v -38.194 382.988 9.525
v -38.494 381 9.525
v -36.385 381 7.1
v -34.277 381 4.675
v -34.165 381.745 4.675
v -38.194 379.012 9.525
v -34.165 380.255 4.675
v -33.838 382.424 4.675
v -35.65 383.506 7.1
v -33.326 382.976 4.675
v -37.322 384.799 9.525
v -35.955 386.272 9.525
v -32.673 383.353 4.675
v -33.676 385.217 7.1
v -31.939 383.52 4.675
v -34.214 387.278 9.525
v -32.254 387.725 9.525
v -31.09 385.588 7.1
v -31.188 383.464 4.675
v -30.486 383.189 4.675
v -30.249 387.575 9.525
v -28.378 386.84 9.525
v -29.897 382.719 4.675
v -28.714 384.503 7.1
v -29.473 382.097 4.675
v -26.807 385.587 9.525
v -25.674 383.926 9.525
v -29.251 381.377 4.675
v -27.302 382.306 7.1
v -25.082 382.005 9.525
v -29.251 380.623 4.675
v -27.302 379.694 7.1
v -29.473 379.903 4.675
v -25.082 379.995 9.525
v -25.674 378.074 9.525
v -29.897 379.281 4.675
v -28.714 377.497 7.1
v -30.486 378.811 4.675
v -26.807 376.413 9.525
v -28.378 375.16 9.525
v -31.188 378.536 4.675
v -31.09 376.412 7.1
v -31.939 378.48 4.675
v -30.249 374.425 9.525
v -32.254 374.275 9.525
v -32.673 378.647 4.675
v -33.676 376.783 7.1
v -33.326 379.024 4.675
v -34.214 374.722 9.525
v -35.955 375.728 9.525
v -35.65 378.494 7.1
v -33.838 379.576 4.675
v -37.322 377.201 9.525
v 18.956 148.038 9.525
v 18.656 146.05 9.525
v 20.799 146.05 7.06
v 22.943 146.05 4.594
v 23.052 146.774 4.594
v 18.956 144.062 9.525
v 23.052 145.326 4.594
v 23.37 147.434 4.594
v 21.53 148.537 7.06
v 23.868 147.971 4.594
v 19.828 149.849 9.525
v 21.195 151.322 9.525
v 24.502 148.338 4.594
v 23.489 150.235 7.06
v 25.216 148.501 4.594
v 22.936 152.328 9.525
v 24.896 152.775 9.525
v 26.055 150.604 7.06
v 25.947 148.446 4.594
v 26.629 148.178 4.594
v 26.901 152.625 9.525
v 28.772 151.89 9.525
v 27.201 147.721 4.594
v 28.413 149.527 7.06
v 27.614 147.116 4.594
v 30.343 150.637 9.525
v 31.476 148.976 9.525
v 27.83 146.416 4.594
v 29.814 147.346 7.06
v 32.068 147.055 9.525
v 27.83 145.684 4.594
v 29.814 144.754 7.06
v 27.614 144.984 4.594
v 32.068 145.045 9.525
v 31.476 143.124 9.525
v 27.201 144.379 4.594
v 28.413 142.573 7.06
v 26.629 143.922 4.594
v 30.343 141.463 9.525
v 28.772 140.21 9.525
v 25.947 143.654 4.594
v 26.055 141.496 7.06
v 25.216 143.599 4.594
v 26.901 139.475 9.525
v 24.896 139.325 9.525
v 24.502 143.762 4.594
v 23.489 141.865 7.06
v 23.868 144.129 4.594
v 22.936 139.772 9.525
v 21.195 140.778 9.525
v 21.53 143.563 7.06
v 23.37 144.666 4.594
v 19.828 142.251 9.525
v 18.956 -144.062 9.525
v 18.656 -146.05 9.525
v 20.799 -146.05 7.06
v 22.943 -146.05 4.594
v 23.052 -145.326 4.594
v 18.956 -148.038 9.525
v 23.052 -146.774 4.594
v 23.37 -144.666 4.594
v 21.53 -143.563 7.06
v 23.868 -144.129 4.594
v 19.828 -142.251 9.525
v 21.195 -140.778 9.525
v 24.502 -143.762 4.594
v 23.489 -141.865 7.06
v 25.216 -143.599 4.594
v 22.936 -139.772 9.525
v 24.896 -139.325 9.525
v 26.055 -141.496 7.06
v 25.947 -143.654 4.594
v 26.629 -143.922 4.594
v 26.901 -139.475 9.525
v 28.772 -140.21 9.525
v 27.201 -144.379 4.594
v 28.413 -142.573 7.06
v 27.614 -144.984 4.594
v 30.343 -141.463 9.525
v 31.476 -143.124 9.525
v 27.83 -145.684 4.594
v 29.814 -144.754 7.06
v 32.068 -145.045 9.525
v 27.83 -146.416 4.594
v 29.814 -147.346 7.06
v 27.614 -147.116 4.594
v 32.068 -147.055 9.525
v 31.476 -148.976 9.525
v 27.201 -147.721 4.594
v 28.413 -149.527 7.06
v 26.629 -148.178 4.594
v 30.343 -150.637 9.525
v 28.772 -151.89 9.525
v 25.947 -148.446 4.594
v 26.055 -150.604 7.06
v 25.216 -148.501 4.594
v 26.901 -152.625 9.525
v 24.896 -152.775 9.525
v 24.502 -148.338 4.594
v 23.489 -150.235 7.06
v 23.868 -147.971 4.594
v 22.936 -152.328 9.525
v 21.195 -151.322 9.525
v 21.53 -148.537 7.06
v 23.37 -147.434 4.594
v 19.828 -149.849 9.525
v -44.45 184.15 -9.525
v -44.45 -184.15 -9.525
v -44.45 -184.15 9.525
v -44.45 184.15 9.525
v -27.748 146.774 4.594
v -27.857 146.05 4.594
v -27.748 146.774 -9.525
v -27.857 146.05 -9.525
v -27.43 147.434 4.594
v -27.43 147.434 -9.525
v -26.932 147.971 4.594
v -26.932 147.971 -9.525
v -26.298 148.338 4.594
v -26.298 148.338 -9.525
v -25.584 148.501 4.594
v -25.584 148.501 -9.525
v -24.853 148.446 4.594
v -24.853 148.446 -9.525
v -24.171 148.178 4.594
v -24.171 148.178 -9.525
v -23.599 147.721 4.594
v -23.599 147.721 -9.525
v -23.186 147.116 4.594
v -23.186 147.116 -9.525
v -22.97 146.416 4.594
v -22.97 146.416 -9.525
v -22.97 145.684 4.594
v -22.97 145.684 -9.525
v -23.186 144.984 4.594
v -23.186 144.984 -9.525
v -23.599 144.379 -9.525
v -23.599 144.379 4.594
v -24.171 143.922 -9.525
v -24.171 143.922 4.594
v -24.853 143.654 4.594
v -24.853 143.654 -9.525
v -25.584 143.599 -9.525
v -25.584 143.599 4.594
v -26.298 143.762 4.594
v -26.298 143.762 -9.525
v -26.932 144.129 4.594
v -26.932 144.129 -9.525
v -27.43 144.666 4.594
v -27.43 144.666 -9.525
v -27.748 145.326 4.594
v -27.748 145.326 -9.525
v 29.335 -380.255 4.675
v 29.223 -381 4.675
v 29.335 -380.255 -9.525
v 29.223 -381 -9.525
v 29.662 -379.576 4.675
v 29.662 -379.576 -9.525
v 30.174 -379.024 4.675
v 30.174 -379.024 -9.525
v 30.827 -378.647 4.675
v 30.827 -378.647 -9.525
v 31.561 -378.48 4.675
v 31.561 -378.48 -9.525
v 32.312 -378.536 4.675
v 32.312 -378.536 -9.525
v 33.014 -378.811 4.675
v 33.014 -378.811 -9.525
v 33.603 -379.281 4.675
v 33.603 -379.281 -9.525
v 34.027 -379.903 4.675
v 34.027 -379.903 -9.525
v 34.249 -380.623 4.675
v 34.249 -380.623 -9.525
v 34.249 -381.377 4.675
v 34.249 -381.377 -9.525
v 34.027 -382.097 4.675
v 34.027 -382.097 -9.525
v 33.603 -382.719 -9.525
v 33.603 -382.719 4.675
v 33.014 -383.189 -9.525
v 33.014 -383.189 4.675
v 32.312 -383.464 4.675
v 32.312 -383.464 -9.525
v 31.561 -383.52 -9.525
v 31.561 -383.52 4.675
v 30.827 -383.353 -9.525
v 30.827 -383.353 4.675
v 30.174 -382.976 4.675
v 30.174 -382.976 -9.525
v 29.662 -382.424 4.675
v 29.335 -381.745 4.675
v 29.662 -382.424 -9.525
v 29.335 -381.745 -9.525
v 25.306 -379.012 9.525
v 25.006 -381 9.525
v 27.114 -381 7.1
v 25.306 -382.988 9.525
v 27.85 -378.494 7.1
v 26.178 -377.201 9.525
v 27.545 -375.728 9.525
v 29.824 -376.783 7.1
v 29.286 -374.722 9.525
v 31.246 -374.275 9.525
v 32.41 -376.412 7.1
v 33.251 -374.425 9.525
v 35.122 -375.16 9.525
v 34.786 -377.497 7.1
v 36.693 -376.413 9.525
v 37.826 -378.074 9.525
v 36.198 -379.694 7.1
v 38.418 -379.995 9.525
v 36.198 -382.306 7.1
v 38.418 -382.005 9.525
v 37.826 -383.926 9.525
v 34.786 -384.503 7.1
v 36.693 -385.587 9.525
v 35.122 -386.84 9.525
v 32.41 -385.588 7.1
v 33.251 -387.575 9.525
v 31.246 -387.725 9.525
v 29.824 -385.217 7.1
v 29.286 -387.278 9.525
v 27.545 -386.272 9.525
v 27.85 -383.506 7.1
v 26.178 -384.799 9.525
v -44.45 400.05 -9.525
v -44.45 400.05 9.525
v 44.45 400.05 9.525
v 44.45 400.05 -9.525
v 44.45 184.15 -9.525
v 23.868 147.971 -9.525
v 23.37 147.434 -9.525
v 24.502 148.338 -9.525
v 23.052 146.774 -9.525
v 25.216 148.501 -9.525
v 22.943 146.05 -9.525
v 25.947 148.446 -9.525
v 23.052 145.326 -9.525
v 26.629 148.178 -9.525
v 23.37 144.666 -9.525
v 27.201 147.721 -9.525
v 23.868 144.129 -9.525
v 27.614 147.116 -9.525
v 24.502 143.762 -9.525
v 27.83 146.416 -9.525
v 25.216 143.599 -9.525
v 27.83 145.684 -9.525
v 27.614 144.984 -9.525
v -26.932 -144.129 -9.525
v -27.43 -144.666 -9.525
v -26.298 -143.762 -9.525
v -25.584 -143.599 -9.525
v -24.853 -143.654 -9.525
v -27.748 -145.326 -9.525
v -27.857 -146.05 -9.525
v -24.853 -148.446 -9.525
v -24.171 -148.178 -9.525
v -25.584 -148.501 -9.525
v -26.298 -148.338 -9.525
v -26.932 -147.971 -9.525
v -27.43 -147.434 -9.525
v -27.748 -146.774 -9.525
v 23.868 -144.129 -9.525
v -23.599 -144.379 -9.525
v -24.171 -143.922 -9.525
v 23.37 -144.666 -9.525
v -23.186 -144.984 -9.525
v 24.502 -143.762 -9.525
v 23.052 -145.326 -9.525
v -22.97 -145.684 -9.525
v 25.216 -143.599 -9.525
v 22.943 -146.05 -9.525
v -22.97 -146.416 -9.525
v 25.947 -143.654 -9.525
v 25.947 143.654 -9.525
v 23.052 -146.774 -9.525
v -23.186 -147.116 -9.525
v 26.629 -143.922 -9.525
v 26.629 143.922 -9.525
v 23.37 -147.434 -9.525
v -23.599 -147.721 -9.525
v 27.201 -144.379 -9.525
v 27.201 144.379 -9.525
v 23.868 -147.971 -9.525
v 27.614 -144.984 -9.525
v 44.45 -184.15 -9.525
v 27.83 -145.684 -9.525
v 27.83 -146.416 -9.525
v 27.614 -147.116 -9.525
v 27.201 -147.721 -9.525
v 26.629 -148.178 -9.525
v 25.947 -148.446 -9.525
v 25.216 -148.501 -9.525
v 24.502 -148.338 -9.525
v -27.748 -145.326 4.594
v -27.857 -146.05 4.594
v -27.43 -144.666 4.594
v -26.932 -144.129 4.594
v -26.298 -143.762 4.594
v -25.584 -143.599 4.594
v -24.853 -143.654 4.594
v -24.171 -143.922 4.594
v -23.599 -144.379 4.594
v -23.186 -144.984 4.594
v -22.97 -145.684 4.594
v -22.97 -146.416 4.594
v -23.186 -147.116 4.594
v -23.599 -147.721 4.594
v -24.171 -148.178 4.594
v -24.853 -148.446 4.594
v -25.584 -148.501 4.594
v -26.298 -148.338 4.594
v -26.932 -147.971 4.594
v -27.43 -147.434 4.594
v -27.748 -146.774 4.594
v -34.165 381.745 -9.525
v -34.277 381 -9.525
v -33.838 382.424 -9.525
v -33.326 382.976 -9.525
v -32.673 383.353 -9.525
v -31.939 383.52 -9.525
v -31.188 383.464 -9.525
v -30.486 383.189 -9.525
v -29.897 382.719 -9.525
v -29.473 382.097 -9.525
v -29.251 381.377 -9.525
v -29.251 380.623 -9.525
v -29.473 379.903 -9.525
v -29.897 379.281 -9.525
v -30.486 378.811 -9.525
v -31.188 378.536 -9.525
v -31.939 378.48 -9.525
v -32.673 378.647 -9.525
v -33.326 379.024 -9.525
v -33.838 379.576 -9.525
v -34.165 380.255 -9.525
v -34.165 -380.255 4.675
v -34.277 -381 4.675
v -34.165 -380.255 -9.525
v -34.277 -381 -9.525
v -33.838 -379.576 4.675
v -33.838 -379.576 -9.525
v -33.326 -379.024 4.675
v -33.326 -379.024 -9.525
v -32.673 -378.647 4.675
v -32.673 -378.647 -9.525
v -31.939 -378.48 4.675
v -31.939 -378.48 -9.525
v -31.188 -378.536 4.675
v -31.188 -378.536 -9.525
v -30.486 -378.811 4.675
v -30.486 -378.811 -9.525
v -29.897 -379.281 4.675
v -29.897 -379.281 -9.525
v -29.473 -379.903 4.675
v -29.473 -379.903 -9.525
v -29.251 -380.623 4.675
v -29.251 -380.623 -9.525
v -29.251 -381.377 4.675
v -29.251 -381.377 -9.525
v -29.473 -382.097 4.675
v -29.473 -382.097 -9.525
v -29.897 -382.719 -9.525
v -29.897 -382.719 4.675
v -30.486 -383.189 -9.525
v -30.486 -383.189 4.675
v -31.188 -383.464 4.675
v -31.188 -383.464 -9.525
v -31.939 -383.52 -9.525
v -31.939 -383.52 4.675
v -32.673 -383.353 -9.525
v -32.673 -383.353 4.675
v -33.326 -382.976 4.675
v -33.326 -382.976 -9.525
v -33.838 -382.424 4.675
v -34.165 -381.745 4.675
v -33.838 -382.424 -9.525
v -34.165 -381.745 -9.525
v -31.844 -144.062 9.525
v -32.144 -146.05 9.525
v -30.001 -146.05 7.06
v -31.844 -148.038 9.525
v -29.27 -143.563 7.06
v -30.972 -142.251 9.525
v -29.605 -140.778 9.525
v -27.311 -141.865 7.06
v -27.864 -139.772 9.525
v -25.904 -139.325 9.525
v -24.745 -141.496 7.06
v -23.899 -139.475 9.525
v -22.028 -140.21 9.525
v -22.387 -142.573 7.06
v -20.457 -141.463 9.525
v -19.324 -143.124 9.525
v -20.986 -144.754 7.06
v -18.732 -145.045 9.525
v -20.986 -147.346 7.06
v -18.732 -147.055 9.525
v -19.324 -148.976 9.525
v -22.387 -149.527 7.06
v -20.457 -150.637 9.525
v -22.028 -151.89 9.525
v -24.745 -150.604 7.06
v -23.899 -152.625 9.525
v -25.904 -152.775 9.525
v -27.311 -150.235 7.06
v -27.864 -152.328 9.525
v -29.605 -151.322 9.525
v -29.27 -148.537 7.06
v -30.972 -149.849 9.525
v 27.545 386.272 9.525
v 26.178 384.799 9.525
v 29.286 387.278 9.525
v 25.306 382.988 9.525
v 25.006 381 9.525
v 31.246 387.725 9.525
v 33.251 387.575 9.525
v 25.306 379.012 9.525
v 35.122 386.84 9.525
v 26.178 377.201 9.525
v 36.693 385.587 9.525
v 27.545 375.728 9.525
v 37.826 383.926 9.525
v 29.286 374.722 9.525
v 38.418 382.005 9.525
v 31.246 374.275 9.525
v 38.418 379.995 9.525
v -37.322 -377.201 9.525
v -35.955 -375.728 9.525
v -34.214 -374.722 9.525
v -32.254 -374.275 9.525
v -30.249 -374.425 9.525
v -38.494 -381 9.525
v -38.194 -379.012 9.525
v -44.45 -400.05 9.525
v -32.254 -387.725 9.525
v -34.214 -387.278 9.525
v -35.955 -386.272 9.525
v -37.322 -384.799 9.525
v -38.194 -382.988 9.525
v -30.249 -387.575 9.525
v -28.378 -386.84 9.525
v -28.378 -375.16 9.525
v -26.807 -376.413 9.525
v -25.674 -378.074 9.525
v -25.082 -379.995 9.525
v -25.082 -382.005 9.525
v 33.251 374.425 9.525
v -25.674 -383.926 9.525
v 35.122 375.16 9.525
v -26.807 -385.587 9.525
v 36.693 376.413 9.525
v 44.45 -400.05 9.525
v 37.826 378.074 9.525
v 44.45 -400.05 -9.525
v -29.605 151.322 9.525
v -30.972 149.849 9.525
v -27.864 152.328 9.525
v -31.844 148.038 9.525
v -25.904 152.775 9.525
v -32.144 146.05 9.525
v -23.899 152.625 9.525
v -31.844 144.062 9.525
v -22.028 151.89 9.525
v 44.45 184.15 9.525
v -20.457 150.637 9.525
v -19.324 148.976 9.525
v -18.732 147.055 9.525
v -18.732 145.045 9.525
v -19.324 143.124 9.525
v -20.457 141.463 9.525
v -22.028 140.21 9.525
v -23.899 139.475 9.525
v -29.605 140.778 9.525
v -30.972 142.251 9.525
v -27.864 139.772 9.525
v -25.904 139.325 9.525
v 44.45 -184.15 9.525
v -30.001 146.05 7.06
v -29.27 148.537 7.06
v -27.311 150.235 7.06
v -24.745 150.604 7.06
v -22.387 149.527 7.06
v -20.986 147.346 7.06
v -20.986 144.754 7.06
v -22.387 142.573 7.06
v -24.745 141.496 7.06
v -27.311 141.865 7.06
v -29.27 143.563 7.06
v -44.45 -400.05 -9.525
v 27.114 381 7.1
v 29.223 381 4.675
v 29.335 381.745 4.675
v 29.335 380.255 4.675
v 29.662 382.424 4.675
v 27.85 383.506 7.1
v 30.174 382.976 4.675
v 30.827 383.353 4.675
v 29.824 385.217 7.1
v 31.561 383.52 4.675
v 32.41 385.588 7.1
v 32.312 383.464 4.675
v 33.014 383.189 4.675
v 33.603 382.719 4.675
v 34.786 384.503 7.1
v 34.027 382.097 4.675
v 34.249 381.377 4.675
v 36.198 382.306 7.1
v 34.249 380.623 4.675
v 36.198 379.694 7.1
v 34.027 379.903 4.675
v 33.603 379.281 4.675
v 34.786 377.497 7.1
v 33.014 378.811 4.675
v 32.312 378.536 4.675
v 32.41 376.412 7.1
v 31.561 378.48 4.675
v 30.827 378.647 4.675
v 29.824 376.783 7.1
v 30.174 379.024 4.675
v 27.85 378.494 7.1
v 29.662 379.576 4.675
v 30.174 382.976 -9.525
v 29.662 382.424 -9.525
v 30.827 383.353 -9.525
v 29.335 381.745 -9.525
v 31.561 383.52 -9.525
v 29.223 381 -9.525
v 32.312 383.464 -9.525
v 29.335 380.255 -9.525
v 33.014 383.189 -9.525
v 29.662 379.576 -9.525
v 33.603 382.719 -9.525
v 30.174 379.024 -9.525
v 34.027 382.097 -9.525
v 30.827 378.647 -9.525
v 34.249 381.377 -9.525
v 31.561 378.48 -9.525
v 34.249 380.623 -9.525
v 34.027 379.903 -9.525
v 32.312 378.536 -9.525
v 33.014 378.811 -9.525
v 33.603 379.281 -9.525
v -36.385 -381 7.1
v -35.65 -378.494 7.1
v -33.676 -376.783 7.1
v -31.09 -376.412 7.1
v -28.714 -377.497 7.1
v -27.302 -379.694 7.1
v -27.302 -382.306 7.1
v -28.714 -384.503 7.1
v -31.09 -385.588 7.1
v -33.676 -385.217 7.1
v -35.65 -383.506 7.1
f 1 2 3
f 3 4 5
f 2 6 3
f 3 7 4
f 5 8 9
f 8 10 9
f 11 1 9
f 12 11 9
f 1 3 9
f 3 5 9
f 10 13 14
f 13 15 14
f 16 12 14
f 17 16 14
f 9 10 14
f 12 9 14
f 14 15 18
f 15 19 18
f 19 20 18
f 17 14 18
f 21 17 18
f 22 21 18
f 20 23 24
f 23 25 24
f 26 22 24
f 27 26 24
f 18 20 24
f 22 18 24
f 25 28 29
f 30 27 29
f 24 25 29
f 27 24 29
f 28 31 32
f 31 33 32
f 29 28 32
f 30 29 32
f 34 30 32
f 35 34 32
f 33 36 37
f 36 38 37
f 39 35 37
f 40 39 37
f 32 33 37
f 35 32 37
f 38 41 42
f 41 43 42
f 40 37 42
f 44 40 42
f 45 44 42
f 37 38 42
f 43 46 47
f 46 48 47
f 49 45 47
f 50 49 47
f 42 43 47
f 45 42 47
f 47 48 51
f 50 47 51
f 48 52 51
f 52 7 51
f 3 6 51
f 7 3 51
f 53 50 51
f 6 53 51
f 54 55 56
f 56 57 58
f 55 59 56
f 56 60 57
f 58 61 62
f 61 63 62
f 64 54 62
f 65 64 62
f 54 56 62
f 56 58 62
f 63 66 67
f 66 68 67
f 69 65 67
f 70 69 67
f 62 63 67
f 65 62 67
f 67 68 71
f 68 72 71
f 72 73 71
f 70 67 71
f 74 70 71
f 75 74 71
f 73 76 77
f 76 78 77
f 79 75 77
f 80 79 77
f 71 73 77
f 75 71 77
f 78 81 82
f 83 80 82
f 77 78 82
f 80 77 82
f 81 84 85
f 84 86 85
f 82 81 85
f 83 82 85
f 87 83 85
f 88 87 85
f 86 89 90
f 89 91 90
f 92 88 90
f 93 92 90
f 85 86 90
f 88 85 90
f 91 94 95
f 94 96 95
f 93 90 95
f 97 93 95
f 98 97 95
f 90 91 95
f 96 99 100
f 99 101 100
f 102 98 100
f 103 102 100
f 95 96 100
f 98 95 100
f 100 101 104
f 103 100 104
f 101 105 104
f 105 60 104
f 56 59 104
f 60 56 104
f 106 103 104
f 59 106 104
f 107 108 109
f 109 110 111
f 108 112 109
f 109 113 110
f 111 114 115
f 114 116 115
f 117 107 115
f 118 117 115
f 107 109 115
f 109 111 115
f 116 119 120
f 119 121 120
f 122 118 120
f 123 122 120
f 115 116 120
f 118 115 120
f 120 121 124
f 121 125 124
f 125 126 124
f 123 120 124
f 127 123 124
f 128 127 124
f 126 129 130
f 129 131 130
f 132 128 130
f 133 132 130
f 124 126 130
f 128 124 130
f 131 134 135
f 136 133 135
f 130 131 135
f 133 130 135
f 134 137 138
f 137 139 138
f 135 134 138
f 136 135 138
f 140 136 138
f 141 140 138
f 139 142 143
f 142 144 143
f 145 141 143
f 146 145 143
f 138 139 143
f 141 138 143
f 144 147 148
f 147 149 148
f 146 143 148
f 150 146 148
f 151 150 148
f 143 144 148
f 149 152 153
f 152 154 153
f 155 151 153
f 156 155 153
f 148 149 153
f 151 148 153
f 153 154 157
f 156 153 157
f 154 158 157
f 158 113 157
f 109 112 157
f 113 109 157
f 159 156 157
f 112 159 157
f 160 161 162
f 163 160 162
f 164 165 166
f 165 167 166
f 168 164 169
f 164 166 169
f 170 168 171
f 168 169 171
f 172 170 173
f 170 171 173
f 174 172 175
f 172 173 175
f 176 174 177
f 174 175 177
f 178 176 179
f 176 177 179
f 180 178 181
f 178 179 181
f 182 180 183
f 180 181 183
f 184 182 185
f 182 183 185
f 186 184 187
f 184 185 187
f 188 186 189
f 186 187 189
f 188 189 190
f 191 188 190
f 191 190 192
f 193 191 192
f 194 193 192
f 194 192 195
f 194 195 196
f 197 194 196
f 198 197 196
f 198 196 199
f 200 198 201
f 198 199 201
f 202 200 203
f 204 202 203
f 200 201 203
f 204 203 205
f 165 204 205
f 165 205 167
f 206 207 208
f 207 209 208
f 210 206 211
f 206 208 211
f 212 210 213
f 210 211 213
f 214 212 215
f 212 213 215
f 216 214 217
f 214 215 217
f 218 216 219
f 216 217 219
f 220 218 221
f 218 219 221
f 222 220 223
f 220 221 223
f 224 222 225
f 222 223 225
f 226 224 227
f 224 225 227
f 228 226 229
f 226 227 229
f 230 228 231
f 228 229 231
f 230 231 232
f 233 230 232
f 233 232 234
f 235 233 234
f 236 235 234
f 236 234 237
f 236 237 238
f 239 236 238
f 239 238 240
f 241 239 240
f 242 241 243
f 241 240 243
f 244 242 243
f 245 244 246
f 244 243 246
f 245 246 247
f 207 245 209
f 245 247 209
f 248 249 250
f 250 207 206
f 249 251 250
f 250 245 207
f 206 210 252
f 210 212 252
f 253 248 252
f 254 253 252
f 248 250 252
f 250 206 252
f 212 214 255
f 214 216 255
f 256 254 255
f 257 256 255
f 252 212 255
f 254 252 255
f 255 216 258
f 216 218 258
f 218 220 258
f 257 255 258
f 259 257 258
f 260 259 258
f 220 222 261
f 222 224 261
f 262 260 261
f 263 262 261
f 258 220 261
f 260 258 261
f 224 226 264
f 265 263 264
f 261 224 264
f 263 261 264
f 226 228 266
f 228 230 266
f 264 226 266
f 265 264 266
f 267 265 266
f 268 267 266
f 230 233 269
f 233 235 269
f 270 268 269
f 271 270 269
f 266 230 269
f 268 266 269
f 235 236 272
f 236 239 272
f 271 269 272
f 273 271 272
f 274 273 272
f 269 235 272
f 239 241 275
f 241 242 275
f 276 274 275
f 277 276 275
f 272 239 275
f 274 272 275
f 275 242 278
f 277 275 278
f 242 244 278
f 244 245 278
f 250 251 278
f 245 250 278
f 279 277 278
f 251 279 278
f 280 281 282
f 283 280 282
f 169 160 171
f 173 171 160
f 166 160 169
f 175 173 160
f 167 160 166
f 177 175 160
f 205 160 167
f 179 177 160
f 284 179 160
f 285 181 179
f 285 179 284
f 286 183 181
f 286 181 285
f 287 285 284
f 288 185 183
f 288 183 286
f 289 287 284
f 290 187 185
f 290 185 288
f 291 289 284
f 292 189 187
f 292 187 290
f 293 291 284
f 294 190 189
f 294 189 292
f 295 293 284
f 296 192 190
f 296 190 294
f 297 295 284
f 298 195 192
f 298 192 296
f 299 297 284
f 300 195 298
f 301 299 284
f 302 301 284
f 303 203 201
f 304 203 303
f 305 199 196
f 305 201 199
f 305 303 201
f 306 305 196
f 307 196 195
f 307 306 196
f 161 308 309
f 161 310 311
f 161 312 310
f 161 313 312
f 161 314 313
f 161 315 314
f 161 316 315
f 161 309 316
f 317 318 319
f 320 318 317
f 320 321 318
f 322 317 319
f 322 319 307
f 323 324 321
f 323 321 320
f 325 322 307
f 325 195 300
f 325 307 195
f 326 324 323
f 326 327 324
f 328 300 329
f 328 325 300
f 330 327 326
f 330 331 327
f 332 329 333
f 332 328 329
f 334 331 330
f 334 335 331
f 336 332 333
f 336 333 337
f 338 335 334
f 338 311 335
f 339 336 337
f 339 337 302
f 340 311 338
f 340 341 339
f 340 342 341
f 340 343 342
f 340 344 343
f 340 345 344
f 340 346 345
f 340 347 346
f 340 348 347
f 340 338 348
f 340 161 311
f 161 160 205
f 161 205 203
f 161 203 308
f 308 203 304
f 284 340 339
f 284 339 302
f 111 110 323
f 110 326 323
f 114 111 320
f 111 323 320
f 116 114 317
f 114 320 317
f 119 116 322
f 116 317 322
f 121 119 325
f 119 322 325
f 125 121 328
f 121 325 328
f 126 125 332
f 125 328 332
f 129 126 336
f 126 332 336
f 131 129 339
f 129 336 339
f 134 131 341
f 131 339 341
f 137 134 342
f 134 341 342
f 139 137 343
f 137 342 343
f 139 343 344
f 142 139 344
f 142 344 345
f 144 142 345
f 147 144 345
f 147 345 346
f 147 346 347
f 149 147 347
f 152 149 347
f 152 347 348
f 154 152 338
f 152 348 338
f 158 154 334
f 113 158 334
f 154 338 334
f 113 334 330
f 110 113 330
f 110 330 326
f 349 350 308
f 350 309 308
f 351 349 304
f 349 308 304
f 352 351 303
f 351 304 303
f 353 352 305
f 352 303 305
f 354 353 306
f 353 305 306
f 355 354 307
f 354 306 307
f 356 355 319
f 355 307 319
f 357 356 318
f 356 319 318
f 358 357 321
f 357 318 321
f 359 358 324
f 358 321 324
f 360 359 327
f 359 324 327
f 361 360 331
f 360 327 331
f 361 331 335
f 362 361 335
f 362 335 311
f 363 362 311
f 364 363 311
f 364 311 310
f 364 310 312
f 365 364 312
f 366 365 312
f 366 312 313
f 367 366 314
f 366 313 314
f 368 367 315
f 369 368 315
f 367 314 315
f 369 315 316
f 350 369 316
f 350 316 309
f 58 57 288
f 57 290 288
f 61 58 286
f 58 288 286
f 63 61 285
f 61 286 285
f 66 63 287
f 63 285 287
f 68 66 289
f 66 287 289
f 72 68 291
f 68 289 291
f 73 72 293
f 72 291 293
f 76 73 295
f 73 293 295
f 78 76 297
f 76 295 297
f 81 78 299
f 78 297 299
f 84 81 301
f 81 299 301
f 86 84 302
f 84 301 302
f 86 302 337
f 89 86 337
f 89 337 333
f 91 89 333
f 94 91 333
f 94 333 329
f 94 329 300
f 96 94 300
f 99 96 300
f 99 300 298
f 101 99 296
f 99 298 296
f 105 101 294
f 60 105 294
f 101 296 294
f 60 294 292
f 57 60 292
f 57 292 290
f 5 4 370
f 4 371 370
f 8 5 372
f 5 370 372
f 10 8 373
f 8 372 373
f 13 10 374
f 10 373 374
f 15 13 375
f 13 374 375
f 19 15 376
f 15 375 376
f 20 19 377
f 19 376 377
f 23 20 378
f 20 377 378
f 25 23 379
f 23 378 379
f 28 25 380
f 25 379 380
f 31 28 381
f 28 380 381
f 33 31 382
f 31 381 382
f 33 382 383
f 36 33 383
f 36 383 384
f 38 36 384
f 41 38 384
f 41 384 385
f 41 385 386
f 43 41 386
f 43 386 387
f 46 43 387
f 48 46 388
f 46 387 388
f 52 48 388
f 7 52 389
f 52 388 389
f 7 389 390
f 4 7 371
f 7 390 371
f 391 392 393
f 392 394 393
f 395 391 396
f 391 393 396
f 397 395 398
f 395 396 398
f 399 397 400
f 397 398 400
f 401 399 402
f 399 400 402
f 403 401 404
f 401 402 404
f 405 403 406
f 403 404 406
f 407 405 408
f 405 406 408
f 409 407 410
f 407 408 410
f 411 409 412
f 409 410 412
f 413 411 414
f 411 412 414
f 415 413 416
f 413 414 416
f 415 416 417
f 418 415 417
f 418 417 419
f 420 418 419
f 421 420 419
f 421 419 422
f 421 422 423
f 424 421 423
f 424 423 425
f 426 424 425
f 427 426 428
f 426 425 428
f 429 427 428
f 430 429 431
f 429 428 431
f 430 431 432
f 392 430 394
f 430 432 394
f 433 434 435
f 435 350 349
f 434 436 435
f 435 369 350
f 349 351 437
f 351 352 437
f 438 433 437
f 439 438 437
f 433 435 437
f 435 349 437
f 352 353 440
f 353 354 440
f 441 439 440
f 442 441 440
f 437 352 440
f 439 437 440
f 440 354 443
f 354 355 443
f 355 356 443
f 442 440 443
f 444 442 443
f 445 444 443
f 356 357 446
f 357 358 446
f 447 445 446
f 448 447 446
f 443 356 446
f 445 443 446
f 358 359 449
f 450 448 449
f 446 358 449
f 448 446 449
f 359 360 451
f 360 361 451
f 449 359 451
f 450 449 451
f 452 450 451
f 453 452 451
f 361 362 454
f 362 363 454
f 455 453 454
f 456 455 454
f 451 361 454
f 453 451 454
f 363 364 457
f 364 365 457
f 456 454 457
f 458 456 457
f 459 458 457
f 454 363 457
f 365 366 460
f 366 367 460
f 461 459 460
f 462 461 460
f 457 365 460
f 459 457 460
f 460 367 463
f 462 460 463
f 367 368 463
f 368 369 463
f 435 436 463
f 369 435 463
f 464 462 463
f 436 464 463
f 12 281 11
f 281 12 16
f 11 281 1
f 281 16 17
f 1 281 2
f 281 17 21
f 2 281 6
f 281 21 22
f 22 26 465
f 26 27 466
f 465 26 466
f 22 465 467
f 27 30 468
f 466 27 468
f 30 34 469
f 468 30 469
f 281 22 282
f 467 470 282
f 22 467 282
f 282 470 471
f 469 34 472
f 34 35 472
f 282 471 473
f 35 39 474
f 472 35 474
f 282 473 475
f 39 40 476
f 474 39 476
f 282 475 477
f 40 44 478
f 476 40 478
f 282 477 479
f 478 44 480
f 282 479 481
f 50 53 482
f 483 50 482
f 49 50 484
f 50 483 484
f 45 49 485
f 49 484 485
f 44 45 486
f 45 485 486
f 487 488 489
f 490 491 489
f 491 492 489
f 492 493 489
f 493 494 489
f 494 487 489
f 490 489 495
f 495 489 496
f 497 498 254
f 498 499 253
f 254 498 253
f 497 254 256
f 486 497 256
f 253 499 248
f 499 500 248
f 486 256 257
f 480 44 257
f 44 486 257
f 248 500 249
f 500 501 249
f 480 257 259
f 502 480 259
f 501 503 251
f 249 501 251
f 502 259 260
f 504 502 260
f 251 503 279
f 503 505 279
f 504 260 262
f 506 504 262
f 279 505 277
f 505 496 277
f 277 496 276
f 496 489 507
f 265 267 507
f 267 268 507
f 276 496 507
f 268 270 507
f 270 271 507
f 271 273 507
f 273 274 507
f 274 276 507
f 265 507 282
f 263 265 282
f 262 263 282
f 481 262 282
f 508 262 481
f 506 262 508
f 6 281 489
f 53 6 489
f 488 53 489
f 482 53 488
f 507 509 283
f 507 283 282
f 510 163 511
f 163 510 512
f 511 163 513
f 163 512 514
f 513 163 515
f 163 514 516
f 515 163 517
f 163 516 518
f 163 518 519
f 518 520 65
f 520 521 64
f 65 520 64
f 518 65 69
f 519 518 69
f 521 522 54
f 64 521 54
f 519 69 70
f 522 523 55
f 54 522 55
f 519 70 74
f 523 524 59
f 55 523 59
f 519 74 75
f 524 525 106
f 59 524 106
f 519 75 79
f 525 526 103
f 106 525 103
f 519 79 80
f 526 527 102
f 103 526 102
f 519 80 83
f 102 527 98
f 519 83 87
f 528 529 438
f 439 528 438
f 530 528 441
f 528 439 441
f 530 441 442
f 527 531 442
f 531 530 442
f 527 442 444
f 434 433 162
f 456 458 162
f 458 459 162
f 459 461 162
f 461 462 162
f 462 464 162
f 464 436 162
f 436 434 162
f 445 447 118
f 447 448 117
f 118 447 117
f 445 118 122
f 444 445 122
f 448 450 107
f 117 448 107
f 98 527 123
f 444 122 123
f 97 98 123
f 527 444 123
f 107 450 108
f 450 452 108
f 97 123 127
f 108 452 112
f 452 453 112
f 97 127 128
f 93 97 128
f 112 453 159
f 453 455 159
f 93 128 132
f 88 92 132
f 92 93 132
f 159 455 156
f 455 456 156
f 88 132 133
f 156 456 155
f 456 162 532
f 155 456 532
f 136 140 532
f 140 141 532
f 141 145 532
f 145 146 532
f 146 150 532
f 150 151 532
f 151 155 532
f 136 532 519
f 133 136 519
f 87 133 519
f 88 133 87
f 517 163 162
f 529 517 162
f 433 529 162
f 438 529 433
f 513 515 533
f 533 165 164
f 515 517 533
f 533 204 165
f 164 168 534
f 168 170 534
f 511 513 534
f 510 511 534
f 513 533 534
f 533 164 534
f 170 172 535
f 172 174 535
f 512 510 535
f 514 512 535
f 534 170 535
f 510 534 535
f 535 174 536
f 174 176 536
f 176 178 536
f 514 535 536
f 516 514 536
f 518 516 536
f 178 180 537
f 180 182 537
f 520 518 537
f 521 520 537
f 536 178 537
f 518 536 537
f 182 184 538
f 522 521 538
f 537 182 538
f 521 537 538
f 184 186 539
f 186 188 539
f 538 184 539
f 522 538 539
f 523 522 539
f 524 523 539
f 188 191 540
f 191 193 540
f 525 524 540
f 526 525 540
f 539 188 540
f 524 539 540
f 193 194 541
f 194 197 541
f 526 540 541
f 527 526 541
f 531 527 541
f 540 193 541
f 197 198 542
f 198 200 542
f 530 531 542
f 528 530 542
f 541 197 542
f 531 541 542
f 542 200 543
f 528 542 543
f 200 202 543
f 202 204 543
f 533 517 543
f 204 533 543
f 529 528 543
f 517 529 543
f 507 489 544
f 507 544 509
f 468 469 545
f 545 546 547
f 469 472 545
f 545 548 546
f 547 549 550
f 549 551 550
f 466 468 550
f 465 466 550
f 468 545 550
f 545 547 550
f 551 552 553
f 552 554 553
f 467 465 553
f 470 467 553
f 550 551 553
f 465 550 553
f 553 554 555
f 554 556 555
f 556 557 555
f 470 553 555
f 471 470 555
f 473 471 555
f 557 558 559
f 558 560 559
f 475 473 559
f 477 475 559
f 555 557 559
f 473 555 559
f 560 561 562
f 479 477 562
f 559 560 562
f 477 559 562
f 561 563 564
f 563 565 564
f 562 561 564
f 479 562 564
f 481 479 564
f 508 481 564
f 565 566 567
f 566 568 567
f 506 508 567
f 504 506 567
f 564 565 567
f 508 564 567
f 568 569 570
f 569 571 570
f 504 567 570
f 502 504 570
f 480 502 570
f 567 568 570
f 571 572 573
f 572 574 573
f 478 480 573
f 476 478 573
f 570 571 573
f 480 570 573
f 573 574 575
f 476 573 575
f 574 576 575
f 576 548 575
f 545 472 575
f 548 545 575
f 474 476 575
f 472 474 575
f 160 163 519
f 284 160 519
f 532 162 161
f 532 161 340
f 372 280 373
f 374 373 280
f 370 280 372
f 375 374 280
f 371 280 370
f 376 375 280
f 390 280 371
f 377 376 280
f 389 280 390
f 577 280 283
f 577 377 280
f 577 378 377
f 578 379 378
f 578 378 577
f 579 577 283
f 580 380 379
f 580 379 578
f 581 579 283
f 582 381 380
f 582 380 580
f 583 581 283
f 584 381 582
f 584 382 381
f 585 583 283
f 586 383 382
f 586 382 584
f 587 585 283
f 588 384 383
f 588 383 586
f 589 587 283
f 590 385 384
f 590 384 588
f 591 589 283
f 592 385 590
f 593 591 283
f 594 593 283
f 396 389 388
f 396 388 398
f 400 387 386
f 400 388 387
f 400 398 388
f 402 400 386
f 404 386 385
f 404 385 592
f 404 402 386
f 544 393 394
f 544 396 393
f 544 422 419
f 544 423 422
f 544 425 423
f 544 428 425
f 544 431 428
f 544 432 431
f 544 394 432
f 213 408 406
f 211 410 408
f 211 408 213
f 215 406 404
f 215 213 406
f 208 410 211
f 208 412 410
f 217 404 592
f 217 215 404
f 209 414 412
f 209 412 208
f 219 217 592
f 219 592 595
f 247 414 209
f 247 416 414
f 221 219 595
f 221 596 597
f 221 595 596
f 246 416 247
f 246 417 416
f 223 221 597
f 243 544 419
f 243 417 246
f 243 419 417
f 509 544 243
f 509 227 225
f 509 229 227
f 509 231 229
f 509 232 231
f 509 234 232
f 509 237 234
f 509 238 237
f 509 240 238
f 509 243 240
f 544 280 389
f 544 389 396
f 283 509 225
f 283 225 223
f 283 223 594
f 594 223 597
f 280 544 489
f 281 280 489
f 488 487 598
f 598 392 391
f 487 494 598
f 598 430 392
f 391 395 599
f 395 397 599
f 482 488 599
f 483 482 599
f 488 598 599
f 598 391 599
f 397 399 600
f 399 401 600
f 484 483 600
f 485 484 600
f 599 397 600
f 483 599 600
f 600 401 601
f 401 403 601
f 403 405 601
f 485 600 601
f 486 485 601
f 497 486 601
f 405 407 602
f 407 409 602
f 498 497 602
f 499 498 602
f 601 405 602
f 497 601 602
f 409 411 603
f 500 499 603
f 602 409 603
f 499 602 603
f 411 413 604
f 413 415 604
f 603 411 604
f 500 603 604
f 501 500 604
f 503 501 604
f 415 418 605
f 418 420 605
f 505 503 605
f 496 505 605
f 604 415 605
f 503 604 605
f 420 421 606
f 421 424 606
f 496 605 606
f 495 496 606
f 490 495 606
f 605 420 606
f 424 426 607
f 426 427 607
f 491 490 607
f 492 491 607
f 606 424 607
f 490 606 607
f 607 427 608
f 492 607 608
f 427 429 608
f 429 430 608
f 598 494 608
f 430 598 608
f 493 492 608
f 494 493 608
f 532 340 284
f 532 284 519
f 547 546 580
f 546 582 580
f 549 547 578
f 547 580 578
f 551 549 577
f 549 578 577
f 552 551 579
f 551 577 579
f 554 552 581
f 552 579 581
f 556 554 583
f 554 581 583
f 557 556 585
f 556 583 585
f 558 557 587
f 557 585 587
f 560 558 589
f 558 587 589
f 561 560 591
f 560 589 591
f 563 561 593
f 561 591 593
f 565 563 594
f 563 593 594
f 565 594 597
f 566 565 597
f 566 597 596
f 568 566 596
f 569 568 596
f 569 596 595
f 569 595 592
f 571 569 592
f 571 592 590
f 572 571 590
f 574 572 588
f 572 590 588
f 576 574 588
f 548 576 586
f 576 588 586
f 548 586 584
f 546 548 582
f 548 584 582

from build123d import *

# Parameters (mm, degrees)
F0_W           = 88.9
F0_H           = 19.05
F1_DEPTH       = 184.15
F3_D           = 4.9149
F3_CSINK_D     = 13.4874
F3_CSINK_ANGLE = 82
F4_DEPTH       = 400.05
F6_D           = 5.0546
F6_CSINK_D     = 13.4874
F6_CSINK_ANGLE = 82


with BuildPart() as f1:
    # F0 (on Front) → F1 (new body, symmetric)
    with BuildSketch(Plane.XZ):
        Rectangle(F0_W, F0_H)
    extrude(amount=F1_DEPTH, both=True)

    # F3 (through all)
    with Locations(Plane.XY.offset(9.525)):
        with Locations((-25.4, -146.05), (25.4, -146.05), (-25.4, 146.05), (25.4, 146.05)):
            CounterSinkHole(F3_D / 2, F3_CSINK_D / 2, counter_sink_angle=F3_CSINK_ANGLE)


with BuildPart() as f4:
    # F0 (on Front) → F4 (new body, symmetric)
    with BuildSketch(Plane.XZ):
        Rectangle(F0_W, F0_H)
    extrude(amount=F4_DEPTH, both=True)

    # F6 (through all)
    with Locations(Plane.XY.offset(9.525)):
        with Locations((-31.75, -381), (31.75, -381), (-31.75, 381), (31.75, 381)):
            CounterSinkHole(F6_D / 2, F6_CSINK_D / 2, counter_sink_angle=F6_CSINK_ANGLE)


solid = Compound([f1.part, f4.part])
